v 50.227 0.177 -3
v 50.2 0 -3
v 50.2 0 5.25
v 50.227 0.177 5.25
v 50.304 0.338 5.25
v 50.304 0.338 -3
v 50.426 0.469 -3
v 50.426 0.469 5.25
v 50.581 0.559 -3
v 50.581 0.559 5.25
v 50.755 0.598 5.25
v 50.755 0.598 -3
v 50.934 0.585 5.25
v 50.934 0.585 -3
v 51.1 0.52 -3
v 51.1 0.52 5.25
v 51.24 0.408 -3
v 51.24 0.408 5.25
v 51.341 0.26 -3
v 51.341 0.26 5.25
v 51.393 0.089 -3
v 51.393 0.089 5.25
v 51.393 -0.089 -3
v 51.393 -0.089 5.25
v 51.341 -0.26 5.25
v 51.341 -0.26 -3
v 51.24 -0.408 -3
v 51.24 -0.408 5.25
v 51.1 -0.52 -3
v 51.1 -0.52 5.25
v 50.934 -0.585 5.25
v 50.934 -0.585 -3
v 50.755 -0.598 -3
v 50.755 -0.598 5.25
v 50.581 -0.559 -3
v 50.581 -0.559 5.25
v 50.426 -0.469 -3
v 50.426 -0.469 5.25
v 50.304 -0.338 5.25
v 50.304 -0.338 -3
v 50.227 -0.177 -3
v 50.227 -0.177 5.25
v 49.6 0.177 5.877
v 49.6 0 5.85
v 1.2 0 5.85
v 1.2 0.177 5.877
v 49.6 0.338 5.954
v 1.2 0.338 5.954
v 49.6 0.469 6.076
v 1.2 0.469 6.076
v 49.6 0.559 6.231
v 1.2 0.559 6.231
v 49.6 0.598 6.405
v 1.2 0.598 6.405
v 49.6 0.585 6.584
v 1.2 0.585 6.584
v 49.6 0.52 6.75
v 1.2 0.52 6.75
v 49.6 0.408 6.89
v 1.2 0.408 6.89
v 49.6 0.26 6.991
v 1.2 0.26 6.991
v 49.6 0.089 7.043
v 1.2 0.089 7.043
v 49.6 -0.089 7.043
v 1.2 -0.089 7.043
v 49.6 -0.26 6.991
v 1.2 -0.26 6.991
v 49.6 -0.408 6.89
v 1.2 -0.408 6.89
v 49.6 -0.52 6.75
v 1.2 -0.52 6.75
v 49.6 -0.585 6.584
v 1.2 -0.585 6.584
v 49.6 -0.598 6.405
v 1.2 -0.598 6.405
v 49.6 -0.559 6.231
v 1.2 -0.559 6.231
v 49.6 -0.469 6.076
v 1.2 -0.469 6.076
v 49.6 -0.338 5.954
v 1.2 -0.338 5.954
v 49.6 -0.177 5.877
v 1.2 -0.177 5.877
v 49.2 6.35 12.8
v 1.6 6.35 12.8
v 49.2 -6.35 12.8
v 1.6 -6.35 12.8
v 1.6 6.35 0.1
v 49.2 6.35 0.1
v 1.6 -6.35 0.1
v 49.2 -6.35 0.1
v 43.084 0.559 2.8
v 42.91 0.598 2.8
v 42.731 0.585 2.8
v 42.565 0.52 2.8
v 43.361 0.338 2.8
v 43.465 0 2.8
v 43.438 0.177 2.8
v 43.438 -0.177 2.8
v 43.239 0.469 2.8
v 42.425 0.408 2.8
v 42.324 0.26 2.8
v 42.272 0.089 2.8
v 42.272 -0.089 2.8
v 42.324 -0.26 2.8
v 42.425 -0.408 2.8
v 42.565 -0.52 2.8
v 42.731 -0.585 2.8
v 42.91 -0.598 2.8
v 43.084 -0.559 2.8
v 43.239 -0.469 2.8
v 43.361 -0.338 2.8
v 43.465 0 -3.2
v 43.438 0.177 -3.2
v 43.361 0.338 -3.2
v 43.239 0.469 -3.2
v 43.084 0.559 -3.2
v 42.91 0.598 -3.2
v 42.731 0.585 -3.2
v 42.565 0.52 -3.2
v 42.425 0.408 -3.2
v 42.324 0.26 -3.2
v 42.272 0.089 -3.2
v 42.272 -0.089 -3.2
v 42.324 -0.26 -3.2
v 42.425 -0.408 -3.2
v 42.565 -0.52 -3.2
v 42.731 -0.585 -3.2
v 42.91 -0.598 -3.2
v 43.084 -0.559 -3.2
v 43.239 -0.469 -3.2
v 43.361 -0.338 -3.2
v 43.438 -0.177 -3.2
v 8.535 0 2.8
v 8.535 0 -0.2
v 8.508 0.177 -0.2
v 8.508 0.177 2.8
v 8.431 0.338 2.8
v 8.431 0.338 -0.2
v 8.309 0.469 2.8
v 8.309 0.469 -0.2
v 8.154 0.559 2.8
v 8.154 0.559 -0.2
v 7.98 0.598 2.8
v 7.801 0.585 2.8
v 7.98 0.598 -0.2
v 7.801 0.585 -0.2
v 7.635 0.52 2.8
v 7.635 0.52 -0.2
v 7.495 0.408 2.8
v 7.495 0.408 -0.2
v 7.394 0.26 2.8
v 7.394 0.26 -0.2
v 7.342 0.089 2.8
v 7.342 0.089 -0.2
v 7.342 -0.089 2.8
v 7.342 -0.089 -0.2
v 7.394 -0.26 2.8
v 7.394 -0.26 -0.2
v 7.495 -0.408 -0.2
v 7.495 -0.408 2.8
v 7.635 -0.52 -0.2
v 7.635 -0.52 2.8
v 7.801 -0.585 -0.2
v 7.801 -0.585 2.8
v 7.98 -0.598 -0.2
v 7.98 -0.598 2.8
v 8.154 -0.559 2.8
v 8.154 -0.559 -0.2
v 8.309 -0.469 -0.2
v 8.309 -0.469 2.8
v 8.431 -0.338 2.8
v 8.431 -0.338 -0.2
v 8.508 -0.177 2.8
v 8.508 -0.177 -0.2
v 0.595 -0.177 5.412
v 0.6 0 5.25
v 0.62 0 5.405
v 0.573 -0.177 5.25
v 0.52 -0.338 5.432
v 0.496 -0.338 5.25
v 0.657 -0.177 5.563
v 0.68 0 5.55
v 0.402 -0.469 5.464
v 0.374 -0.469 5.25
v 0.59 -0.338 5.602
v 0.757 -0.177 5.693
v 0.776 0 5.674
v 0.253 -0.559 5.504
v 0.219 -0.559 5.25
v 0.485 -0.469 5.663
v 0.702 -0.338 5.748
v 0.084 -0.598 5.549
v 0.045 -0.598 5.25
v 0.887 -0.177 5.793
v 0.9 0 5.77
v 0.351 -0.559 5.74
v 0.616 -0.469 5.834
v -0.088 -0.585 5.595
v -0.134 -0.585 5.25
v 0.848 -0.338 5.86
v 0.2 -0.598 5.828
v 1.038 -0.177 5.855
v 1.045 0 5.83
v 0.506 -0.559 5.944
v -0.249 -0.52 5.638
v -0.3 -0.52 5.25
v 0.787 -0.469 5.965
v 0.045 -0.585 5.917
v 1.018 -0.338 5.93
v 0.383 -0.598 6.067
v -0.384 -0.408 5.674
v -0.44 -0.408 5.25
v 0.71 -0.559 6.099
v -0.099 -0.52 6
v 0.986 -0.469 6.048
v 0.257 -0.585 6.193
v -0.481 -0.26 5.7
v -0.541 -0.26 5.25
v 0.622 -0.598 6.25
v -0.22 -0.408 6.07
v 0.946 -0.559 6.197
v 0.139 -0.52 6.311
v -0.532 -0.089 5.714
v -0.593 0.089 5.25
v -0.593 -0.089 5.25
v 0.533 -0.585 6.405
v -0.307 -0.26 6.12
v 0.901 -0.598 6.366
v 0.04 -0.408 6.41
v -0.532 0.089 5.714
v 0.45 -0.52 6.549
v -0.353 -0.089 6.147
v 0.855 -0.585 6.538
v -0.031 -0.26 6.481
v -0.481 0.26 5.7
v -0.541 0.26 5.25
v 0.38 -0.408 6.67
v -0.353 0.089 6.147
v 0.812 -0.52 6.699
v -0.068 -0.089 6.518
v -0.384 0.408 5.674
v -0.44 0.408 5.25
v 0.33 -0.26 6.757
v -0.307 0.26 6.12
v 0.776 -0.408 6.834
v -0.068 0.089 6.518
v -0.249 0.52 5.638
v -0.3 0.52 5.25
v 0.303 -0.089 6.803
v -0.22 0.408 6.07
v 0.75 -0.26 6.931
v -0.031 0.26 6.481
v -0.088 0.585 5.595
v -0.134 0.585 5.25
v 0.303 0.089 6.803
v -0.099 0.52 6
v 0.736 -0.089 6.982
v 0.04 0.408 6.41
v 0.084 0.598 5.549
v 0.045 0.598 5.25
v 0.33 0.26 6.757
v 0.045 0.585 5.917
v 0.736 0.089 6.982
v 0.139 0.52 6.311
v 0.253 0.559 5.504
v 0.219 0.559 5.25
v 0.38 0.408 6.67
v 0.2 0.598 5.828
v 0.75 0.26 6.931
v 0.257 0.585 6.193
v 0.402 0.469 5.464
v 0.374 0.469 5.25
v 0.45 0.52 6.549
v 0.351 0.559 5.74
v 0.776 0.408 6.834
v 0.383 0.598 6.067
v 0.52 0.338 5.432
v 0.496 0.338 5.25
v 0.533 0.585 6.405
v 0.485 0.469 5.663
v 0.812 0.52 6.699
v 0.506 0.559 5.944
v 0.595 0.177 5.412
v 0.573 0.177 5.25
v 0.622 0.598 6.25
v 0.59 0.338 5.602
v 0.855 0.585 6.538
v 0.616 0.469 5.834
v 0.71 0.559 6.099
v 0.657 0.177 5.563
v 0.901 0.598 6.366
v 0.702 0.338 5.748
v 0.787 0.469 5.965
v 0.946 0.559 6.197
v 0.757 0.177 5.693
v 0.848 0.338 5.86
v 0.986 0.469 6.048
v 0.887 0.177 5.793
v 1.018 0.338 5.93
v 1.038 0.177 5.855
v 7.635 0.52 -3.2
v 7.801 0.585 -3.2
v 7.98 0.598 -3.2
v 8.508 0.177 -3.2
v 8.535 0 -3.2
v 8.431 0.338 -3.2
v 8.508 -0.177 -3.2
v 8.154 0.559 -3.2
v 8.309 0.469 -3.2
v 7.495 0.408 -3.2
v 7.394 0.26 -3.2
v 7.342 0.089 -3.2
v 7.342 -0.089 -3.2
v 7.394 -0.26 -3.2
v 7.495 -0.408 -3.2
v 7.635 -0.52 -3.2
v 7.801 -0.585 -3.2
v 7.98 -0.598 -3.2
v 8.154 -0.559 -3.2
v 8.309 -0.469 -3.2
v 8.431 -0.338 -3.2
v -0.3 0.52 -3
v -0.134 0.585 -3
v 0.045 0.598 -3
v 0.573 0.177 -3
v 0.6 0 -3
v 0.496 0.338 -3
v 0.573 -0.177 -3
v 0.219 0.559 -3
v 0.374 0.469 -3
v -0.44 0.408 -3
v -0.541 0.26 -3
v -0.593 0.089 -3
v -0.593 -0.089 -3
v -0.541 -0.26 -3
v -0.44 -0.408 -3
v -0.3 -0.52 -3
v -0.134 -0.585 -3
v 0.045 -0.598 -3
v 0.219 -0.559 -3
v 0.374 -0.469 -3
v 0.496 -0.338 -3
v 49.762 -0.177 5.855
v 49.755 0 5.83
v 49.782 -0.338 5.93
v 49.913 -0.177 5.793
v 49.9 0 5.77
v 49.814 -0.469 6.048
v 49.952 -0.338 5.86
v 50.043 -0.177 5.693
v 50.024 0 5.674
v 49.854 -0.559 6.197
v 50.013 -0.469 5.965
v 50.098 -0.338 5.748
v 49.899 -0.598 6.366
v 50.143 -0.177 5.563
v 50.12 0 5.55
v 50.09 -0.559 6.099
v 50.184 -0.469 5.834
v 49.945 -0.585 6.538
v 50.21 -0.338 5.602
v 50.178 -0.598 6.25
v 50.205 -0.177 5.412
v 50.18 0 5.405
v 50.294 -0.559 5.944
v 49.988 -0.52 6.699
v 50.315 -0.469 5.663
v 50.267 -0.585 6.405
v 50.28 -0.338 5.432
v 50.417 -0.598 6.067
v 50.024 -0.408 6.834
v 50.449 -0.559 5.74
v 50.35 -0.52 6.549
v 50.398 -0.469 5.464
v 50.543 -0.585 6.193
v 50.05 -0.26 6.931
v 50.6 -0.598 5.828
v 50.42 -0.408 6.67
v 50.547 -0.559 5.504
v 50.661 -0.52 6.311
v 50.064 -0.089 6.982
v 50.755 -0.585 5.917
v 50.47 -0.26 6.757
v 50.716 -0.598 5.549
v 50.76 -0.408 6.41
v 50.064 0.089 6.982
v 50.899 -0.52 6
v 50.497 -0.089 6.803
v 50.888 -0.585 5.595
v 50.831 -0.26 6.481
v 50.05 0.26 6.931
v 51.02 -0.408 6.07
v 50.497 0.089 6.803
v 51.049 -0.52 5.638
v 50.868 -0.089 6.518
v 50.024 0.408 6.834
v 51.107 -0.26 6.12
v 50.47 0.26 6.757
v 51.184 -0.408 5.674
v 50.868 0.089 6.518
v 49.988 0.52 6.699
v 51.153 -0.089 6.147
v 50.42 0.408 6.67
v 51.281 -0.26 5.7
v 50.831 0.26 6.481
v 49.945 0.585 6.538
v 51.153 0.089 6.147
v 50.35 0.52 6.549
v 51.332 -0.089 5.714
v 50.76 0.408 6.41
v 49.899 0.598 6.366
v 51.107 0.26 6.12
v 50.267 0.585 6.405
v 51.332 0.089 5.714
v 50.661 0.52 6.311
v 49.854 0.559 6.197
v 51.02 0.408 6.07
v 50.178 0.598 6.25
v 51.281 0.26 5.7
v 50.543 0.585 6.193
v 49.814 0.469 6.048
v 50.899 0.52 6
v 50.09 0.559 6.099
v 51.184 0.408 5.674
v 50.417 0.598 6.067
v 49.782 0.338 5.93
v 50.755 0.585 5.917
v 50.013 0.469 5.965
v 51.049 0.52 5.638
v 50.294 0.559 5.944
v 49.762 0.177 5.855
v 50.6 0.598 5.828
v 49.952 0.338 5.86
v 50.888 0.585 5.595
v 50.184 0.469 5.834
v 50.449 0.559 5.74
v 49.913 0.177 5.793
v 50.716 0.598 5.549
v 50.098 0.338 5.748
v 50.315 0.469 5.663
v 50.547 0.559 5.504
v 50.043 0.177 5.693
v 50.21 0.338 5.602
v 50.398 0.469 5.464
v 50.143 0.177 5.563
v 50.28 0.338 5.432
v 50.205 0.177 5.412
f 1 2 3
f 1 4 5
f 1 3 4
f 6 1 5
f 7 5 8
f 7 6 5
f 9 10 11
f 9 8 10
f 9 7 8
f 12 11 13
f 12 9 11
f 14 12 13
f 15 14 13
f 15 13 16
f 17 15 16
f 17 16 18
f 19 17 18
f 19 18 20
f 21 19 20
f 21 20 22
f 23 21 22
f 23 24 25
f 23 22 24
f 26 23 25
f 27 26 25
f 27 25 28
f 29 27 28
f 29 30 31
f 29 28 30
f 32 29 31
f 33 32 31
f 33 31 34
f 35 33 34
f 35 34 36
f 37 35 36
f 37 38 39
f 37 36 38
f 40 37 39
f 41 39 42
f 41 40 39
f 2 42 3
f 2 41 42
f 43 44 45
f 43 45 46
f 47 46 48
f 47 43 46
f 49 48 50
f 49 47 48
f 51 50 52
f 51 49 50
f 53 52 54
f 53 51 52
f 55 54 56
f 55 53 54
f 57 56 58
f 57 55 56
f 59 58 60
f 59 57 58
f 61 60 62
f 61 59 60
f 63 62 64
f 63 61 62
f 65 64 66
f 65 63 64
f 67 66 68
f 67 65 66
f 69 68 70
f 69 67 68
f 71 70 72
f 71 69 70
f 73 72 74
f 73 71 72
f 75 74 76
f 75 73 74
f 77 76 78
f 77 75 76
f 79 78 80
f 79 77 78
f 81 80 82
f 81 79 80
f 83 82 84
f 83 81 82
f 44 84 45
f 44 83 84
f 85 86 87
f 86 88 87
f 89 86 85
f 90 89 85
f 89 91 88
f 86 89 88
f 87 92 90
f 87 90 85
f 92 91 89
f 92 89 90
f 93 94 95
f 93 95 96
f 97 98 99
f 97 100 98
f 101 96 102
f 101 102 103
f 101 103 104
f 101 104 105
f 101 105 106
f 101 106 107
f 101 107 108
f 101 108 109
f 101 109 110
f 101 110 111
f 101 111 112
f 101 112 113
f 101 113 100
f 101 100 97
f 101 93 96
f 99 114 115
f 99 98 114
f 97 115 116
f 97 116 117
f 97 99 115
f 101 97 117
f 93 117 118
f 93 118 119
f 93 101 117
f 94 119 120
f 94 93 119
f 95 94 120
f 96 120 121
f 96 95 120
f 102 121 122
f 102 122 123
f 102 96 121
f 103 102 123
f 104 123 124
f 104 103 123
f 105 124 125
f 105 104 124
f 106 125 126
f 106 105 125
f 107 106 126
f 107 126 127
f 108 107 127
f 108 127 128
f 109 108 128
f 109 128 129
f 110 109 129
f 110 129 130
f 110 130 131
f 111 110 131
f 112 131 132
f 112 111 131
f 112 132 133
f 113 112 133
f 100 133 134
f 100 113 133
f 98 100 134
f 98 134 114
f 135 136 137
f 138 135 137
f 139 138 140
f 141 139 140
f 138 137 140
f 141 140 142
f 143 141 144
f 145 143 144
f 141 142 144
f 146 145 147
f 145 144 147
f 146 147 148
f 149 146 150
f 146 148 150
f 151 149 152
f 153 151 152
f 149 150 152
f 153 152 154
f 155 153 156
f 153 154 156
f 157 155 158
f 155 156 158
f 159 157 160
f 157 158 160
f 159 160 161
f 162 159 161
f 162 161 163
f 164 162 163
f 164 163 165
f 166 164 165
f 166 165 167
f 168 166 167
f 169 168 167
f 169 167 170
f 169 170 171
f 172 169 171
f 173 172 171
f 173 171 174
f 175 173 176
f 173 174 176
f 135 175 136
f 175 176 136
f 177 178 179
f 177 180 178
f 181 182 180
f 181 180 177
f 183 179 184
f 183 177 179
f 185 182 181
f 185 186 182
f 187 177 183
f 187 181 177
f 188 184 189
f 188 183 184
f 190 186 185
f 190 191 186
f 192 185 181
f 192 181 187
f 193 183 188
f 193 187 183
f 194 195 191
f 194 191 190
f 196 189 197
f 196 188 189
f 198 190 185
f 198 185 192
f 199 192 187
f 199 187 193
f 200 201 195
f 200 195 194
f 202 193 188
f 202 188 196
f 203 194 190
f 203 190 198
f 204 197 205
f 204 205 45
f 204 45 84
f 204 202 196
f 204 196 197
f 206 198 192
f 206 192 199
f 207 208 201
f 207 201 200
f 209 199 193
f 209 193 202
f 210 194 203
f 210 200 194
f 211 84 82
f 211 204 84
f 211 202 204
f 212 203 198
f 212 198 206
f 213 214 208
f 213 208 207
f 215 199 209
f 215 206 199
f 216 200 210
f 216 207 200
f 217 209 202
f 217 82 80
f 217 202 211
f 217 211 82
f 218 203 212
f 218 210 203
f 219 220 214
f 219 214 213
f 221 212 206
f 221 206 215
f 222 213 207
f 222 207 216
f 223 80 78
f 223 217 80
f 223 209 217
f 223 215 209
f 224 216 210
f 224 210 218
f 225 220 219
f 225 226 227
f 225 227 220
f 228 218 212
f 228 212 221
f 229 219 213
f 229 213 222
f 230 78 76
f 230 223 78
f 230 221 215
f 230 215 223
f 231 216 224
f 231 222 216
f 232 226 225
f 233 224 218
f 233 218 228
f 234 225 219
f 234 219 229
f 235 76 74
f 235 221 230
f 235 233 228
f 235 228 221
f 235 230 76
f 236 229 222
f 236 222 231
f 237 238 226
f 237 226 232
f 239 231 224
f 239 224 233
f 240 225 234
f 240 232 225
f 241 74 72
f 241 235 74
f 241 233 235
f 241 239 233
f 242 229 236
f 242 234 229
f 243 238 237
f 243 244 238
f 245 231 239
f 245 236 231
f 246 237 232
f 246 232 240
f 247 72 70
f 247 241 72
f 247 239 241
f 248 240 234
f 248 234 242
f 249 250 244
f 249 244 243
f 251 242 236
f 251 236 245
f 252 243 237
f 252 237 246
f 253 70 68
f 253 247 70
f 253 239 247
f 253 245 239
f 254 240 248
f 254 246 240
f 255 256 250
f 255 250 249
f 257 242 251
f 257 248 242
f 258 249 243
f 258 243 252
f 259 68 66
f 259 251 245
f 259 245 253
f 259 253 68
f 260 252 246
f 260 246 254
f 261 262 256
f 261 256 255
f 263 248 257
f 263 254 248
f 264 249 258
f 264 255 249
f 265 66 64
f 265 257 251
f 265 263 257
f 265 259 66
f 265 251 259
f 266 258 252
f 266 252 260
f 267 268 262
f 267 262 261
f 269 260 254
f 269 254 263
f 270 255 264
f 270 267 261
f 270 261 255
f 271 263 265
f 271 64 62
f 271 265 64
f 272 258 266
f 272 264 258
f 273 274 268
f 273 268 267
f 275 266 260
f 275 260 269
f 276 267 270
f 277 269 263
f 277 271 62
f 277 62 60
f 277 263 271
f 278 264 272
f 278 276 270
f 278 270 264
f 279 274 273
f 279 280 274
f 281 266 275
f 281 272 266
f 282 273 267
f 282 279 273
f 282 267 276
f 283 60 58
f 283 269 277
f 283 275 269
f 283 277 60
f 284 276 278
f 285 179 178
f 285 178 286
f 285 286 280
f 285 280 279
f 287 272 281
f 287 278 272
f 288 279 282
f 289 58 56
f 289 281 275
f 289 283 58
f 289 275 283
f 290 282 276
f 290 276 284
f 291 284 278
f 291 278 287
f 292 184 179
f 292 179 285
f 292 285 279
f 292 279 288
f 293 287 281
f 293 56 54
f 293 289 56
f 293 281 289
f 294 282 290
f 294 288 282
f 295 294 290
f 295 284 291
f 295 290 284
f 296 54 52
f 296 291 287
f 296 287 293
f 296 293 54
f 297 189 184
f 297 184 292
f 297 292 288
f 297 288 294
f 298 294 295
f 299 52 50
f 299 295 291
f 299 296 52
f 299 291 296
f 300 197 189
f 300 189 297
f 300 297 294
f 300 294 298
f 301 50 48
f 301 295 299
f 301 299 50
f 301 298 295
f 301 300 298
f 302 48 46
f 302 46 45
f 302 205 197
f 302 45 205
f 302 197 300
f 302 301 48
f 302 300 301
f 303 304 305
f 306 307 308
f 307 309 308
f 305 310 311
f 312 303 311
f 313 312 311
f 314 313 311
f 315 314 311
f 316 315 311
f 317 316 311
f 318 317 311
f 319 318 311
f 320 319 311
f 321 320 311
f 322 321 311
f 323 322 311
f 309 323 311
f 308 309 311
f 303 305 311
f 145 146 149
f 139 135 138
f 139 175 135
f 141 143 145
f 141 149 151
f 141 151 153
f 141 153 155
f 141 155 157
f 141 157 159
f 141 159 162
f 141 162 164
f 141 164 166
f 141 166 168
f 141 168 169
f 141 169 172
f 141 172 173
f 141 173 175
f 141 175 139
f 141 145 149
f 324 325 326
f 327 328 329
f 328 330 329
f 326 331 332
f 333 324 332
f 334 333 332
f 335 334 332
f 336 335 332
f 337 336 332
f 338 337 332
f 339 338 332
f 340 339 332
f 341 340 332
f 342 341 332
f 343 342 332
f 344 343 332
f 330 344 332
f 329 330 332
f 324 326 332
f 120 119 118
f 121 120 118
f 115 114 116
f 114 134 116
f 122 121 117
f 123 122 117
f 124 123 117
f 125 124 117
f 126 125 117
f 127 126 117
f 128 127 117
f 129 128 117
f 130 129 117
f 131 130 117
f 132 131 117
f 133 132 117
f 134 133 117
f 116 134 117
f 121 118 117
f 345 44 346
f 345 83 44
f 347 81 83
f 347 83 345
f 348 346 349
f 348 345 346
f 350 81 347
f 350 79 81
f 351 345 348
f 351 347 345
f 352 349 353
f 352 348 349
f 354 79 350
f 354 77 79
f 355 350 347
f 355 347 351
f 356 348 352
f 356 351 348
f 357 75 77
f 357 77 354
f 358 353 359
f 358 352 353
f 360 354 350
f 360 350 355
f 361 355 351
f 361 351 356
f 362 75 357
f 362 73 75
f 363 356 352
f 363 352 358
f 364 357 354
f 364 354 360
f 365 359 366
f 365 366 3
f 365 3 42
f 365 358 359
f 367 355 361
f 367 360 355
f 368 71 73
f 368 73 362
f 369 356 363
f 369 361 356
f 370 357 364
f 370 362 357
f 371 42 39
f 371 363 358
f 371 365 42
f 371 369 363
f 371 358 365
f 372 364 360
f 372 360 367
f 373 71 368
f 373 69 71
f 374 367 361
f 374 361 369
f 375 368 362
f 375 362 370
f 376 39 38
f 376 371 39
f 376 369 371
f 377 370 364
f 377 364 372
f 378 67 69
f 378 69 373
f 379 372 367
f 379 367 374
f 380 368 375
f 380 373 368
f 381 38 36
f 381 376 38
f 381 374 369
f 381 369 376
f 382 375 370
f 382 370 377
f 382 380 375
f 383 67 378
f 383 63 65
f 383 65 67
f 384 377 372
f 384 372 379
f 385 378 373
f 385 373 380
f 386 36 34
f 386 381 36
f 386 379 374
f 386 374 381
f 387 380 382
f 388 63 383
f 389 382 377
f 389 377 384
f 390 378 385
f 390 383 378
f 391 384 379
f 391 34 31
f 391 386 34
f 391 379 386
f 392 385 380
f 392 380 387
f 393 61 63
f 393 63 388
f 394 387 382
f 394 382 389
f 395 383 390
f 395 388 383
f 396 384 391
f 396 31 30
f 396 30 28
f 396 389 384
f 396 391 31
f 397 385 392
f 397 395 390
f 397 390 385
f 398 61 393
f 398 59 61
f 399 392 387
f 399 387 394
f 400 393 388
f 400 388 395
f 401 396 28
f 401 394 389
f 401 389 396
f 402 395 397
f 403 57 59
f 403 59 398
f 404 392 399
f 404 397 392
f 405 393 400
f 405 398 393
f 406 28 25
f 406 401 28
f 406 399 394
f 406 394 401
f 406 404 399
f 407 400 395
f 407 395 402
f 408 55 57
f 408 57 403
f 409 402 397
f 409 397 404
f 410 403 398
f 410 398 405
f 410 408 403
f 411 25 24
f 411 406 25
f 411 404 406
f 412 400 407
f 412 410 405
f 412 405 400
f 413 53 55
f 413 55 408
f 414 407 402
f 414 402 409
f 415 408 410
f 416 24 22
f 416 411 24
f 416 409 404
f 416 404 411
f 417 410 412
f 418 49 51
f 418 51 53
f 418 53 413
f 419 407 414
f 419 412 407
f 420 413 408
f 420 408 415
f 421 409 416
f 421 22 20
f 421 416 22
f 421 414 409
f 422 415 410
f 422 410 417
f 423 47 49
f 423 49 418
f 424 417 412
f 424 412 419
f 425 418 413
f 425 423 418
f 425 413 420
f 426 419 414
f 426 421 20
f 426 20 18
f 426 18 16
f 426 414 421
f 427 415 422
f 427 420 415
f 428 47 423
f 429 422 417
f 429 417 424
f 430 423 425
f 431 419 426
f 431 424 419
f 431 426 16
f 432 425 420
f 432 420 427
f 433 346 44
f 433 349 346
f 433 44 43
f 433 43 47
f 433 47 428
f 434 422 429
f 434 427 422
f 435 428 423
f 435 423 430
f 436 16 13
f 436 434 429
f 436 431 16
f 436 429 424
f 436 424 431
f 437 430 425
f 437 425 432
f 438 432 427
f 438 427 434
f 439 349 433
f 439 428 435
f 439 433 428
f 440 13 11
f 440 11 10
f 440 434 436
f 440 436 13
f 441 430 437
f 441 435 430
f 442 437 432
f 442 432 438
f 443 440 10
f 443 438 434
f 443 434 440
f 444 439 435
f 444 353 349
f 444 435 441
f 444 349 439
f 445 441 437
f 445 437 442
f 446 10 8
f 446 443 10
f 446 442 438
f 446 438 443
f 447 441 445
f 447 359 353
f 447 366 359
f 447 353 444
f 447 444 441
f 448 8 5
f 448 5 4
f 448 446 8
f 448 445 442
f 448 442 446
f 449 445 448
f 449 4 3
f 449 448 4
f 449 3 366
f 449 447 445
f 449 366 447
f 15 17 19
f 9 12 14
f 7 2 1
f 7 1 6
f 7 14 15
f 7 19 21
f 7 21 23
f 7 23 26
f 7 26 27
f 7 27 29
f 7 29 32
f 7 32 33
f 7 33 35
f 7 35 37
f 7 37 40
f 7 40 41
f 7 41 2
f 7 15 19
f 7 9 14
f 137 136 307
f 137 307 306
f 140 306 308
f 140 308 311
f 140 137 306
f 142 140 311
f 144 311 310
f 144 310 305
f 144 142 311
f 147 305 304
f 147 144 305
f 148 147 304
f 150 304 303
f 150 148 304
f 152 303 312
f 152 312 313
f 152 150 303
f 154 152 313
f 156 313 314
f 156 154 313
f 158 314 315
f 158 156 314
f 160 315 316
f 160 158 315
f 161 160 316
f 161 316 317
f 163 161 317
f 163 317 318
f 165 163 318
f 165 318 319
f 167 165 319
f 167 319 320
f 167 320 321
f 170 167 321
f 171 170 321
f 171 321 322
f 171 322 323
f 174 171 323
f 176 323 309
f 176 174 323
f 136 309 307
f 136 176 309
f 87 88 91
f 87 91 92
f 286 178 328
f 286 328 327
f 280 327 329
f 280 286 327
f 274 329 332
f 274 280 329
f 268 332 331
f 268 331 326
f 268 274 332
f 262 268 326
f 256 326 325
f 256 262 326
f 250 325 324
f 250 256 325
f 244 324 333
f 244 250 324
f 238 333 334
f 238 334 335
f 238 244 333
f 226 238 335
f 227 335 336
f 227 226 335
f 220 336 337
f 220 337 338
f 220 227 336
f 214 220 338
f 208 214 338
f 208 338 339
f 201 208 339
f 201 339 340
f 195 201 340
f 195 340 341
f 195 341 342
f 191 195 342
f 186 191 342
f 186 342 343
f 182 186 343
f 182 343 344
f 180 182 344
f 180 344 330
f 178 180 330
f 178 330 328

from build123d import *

# Parameters (mm, degrees)
SKETCH_R     = 0.6
SKETCH002_W  = 47.6
SKETCH002_H  = 12.7
PAD_DEPTH    = 6.35
SKETCH004_R  = 0.6
PAD001_DEPTH = 3


with BuildPart() as sweep_body:
    # Sweep: sweep along a path in Sketch001
    with BuildLine(Plane.XZ) as sweep_path:
        Line((0, -3), (0, 5.25))
        ThreePointArc((0, 5.25), (0.351475, 6.098531), (1.200009, 6.45))
        Line((1.200009, 6.45), (49.6, 6.45))
        ThreePointArc((49.6, 6.45), (50.448528, 6.098528), (50.8, 5.25))
        Line((50.8, 5.25), (50.8, -3))
    # Sketch → Sweep (sweep)
    with BuildSketch(Plane.XY.offset(-2)):
        Circle(SKETCH_R)
    sweep(path=sweep_path.line)


with BuildPart() as pad:
    # Sketch002 → Pad (new body, symmetric)
    with BuildSketch(Plane.XZ):
        with Locations((25.4, 6.45)):
            Rectangle(SKETCH002_W, SKETCH002_H)
    extrude(amount=PAD_DEPTH, both=True)


with BuildPart() as pad001:
    # Sketch004 → Pad001 (new body, symmetric)
    with BuildSketch(Plane.XY.offset(-0.2)):
        with Locations((7.935, 0)):
            Circle(SKETCH004_R)
        with Locations((42.865, 0)):
            Circle(SKETCH004_R)
    extrude(amount=PAD001_DEPTH, both=True)


solid = Compound([sweep_body.part, pad.part, pad001.part])
